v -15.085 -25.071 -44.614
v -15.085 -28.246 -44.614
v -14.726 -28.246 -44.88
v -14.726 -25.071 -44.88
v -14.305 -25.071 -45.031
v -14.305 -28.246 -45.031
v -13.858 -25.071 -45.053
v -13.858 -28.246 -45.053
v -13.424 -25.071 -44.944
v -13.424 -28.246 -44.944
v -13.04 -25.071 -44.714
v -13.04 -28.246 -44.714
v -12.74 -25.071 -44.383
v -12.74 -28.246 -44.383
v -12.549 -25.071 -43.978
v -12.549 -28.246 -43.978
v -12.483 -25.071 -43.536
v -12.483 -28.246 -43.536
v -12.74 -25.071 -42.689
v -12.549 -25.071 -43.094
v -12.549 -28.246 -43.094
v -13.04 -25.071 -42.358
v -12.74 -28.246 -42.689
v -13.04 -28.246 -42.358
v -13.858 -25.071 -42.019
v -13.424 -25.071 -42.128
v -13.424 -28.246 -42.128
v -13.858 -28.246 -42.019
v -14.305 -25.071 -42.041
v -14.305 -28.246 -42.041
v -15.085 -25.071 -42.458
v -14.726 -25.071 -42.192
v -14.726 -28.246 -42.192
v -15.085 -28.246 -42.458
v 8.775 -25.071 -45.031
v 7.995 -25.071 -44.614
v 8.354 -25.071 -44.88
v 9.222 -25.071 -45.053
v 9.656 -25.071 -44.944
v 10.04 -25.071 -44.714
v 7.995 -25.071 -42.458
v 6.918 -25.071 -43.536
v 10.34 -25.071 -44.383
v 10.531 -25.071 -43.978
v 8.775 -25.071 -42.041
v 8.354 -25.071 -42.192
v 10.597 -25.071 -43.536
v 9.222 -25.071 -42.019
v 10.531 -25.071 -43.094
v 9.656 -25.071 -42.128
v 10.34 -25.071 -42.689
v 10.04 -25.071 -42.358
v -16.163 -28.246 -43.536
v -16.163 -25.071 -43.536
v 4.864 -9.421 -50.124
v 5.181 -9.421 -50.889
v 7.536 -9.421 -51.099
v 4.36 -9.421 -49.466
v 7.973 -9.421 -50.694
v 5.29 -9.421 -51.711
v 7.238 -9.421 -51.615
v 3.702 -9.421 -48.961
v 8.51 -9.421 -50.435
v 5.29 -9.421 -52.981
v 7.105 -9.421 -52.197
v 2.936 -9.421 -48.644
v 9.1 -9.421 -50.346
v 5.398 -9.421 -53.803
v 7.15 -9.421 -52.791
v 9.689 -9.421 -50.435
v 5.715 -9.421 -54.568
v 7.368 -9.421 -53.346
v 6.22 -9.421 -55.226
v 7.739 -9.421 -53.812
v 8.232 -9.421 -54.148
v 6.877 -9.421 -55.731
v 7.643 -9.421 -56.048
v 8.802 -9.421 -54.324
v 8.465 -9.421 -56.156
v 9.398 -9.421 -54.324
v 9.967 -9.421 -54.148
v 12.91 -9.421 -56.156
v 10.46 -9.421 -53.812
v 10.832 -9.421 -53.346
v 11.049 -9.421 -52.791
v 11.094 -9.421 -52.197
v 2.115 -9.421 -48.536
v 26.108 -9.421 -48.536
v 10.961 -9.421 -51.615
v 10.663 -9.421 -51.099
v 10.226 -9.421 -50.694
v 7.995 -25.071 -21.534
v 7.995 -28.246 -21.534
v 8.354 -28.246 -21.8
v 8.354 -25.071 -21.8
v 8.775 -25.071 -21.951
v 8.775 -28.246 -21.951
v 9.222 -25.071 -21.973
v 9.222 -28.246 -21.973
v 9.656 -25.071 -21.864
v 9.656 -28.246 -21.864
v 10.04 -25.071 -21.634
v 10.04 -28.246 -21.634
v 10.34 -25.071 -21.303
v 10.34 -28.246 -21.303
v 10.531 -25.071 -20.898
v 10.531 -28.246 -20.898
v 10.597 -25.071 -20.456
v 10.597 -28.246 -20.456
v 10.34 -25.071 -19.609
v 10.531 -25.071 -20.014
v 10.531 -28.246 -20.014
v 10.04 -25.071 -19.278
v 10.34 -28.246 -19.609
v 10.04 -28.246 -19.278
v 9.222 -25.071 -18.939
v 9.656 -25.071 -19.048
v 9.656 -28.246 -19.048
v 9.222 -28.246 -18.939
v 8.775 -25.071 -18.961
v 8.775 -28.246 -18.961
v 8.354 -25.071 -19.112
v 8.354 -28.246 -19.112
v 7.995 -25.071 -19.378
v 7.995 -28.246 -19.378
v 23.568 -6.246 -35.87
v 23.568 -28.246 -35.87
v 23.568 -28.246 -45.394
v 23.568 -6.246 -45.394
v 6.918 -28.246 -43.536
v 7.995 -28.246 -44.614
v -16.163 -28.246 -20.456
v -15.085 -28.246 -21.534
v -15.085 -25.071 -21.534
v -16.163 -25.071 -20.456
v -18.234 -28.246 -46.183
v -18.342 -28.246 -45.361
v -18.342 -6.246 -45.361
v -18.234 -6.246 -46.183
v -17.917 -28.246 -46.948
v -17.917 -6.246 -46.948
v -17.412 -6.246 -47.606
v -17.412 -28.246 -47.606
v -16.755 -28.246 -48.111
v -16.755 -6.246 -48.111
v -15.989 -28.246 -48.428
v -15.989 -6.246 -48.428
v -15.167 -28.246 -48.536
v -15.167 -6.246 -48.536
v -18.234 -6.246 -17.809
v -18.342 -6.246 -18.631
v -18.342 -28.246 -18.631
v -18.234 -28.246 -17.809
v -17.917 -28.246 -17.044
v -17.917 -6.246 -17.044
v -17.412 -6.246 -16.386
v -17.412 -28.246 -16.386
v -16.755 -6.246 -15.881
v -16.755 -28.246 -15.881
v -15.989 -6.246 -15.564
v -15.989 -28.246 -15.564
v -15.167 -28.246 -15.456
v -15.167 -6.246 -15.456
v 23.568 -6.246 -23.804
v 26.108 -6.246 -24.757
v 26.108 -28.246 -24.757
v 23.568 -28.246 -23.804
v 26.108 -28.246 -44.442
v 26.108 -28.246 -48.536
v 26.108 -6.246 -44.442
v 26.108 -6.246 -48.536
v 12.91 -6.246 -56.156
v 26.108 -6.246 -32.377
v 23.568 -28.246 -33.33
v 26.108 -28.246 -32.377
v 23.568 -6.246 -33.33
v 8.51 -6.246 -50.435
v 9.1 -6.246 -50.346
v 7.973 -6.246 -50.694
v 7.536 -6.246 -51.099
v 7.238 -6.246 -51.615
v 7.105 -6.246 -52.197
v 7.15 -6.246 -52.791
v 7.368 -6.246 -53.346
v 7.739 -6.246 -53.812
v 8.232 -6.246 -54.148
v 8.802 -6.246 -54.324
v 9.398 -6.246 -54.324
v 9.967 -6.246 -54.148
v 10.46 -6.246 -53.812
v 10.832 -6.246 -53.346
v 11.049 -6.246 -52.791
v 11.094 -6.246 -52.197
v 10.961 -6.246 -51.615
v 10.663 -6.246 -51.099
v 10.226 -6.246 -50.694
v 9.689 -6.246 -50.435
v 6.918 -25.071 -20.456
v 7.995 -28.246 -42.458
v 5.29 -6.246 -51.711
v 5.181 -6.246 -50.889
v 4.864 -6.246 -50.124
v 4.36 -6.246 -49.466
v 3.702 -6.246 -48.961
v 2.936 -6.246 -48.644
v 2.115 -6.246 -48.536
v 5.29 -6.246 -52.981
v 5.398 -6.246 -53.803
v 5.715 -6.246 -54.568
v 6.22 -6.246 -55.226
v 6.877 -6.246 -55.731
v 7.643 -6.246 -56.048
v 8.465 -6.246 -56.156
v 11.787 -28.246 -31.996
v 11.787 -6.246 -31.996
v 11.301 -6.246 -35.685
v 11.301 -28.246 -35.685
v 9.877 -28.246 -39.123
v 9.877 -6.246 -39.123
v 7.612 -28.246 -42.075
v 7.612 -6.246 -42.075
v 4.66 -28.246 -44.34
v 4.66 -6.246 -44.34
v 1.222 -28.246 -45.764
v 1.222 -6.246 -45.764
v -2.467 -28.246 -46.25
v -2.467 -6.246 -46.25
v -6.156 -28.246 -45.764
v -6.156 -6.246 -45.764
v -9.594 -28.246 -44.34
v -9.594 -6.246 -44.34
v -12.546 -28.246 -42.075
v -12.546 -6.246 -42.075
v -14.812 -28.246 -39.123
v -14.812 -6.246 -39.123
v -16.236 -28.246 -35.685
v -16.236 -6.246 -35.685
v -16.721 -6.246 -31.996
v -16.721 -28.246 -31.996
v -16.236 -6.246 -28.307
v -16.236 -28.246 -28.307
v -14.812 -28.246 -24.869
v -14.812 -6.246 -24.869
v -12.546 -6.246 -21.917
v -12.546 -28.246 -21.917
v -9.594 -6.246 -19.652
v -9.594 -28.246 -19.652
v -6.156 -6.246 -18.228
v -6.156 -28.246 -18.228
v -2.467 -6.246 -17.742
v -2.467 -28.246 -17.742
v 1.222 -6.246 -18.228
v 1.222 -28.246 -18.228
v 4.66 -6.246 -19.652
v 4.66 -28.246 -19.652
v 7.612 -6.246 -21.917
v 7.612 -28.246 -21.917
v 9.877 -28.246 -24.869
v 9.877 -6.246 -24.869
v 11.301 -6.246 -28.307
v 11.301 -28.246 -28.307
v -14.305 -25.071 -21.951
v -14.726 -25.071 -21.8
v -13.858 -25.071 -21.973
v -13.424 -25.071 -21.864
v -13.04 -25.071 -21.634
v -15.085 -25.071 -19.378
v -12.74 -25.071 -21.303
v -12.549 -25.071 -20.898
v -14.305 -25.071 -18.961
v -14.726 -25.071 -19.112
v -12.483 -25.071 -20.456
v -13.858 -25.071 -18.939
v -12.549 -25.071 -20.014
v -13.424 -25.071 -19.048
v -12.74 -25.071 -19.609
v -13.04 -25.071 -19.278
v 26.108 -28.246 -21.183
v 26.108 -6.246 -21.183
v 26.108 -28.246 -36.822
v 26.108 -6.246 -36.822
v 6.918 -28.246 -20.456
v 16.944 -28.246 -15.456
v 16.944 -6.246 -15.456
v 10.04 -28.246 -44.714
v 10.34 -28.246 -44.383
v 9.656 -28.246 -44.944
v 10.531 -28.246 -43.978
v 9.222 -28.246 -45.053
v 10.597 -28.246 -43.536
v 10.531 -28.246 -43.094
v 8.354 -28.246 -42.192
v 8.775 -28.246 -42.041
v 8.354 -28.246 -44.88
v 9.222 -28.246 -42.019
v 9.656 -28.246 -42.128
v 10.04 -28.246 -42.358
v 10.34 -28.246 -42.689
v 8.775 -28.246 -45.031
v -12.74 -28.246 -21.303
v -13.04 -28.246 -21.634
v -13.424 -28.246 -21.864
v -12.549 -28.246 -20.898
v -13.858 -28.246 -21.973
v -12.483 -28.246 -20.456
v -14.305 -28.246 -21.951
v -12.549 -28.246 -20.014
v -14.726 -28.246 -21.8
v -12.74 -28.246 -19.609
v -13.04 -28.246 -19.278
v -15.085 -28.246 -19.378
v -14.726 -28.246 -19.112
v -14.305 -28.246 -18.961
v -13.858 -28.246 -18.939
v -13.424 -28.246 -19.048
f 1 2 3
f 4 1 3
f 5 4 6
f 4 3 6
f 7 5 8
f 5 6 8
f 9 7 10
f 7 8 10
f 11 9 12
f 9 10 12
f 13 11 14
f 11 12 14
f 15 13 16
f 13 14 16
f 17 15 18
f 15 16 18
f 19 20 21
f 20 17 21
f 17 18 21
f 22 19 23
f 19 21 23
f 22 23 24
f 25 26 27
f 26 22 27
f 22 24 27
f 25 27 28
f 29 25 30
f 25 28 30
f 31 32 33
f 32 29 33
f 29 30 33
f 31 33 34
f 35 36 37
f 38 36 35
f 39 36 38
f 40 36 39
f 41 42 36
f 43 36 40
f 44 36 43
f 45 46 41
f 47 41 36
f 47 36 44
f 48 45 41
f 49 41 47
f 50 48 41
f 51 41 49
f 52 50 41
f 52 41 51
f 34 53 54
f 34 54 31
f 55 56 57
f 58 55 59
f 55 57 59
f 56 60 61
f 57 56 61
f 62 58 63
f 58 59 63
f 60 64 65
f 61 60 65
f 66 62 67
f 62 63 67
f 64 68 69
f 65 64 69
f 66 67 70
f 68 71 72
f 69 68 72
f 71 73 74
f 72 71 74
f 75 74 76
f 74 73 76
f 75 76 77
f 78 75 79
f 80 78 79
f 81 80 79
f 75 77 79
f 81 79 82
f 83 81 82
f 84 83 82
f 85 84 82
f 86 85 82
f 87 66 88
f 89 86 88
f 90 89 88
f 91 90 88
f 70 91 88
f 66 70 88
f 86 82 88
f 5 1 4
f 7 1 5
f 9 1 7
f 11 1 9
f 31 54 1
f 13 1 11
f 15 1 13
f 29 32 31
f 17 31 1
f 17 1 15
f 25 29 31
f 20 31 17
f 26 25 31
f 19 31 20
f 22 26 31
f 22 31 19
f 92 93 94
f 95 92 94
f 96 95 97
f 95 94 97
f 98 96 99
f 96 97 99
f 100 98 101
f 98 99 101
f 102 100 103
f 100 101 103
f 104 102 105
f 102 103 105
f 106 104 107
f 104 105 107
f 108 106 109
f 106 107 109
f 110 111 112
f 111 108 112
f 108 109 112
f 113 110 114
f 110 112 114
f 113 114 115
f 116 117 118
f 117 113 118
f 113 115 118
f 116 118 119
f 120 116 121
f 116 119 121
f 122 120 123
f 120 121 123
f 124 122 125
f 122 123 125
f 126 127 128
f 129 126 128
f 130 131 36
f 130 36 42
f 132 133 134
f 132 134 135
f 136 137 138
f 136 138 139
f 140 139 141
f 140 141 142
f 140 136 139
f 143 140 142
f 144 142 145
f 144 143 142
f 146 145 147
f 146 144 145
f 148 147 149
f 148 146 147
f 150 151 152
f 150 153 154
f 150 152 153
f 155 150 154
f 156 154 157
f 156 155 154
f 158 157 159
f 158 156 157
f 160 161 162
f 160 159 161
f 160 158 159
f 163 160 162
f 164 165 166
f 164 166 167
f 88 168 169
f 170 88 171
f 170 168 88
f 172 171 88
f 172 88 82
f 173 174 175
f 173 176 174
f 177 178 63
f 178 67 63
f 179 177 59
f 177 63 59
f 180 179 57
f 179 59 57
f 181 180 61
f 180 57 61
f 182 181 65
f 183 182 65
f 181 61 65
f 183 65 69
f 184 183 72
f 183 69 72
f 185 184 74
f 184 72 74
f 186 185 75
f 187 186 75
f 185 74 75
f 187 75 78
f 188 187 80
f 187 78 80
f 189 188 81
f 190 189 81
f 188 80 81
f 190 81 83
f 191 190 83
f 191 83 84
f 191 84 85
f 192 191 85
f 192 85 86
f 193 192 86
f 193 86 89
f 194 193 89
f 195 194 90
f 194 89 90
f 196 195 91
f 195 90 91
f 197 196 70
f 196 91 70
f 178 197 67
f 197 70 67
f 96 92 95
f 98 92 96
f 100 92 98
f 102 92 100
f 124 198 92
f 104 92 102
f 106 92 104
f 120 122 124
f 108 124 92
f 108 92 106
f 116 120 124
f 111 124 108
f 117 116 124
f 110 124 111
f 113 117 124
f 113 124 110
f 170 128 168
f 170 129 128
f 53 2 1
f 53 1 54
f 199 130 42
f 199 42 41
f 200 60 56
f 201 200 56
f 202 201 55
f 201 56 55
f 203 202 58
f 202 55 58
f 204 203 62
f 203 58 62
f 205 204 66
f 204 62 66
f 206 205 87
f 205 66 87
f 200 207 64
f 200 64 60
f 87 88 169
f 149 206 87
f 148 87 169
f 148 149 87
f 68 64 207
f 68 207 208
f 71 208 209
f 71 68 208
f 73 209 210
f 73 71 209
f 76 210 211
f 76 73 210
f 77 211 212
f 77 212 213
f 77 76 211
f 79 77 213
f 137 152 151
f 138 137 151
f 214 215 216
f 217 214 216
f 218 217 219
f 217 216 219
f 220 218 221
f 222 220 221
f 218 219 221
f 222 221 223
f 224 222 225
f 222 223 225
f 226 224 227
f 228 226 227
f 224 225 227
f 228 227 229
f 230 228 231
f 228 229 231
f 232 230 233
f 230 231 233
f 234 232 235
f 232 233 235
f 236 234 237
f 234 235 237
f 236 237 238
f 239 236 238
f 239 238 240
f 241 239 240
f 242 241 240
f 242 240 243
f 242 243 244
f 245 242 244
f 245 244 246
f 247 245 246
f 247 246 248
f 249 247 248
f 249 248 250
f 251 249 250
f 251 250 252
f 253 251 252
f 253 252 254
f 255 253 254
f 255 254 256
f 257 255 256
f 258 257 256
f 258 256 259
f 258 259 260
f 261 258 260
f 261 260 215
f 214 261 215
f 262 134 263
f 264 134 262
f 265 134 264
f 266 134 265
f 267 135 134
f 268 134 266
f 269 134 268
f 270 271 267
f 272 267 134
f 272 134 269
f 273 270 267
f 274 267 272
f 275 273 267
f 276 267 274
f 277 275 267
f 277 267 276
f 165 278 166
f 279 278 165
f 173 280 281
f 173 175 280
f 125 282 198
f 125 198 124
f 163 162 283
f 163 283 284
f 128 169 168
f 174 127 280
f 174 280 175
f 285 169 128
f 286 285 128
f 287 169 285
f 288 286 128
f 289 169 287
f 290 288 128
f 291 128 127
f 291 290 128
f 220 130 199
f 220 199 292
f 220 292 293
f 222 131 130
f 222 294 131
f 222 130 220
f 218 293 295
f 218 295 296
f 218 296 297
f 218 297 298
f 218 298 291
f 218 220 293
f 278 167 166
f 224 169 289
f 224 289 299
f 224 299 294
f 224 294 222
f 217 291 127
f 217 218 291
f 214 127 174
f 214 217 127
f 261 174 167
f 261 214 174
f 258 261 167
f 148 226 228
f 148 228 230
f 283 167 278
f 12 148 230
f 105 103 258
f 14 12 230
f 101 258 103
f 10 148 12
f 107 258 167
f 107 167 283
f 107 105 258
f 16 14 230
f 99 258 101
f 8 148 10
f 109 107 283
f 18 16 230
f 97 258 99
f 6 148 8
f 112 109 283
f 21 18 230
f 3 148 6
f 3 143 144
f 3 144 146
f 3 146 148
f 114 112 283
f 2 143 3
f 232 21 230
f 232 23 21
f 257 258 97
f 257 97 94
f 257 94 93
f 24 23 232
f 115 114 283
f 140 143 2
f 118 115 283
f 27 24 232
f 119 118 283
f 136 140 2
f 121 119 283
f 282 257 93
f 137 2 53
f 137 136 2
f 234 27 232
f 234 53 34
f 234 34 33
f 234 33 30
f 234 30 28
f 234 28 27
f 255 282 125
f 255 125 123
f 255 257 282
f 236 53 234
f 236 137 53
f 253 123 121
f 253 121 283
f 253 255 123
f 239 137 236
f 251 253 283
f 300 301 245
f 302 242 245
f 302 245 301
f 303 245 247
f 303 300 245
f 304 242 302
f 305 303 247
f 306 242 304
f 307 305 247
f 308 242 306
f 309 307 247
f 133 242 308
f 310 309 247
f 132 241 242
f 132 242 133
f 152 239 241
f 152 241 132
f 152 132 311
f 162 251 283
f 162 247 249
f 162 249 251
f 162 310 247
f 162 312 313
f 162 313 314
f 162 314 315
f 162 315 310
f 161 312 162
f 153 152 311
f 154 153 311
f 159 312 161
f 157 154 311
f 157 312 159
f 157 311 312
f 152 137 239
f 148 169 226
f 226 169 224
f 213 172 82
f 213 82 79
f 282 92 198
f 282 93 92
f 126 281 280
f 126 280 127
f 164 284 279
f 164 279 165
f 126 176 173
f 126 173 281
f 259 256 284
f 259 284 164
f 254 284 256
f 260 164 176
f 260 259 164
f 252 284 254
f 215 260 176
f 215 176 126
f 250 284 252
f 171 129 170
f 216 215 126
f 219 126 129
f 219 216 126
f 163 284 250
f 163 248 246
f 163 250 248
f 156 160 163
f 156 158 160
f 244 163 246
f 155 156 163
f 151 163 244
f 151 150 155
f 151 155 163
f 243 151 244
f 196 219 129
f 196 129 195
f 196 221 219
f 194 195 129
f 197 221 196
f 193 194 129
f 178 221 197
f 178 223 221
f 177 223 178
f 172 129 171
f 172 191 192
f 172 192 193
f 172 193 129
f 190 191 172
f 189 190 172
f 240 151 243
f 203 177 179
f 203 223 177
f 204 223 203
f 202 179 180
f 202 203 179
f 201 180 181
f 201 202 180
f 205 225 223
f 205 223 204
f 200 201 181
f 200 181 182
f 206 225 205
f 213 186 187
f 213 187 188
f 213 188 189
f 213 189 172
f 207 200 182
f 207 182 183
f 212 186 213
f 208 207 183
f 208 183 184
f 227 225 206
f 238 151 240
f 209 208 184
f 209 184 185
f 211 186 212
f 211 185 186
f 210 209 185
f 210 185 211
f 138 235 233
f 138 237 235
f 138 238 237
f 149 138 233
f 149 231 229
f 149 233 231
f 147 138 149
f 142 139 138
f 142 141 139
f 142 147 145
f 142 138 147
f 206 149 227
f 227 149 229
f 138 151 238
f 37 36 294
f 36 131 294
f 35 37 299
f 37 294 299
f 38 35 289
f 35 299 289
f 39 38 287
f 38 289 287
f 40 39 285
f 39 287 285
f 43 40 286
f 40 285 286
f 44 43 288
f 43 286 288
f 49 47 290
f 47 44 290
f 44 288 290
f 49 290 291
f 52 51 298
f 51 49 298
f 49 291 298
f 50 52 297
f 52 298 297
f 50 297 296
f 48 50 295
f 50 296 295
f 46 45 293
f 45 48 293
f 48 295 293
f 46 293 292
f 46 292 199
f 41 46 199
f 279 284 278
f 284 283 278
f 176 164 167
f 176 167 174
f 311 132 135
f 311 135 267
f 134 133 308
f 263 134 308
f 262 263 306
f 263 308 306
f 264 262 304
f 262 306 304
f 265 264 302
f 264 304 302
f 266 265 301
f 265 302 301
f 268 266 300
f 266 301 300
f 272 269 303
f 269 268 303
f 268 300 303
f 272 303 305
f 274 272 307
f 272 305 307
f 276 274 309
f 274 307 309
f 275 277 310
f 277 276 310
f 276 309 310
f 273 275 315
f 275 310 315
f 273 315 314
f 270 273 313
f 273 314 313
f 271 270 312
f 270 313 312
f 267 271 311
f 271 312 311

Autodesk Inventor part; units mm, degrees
ref_plane "YZ Plane" through (0, 0, 0) normal (1, 0, 0) x (0, 1, 0)
ref_plane "XZ Plane" through (0, 0, 0) normal (0, 1, 0) x (-1, 0, 0)
ref_plane "XY Plane" through (0, 0, 0) normal (0, 0, 1) x (1, 0, 0)
ref_plane "Work Plane1" through (-2.4672, -28.2462, -31.996) normal (1, 0, 0) x (0, 1, 0)
sketch "Sketch1" plane through (-2.4672, -28.2462, -31.996) normal (1, 0, 0) x (0, 1, 0)
  line L0 (0, 16.54) -> (22, 16.54)
  line L1 (22, 16.54) -> (22, -16.54)
  line L2 (22, -16.54) -> (0, -16.54)
  line L3 (0, -16.54) -> (0, 16.54)
  line L4 (0, -14) -> (0, 14) projected
  line L5 (0, 13) -> (22, 13) construction
  line L6 (0, -13) -> (22, -13) construction
  line L7 (22, -14) -> (22, 14) projected
  line L8 (22, 0) -> (0, 0) construction
  point P0 (28.2462, 31.996)
  dimension "d3" = 33.08
extrude "Extrusion1" add sketch "Sketch1" along normal blind 28.575 and the other way blind 15.875
sketch "Sketch5" plane through (-18.3422, -6.2462, -15.456) normal (0, 1, 0) x (1, 0, 0)
  circle A0 centre (15.875, 16.54) radius 4.5 projected
  circle A1 centre (15.875, 16.54) radius 14 projected
  circle A2 centre (15.875, 16.54) radius 14.254
  point P0 (18.3422, -15.456)
  dimension "d9" = 0.254
extrude "Extrusion2" cut sketch "Sketch5" against normal through all contours A0 | A1 | A2
sketch "Sketch6" plane through (-18.3422, -6.2462, -15.456) normal (0, 1, 0) x (1, 0, 0)
  circle A0 centre (15.875, 16.54) radius 14.254 projected
  line L0 (0, 0) -> (44.45, 0) projected
  line L1 (44.45, 33.08) -> (44.45, 0) projected
  line L2 (0, 33.08) -> (44.45, 33.08) projected
  line L3 (0, 0) -> (0, 33.08) projected
  line L4 (44.45, 9.301) -> (41.91, 8.3485)
  line L5 (41.91, 8.3485) -> (41.91, 17.8735)
  line L6 (41.91, 17.8735) -> (44.45, 16.921)
  line L7 (44.45, 21.366) -> (41.91, 20.4135)
  line L8 (41.91, 20.4135) -> (41.91, 29.9385)
  line L9 (41.91, 29.9385) -> (44.45, 28.986)
  line L10 (0, 0) -> (0, 33.08) projected
  line L11 (0, 16.54) -> (44.6434, 16.54) construction
  point P0 (18.3422, -15.456)
  point P1 (41.91, 25.176)
  point P2 (41.91, 13.111)
  dimension "d12" = 9.525
  dimension "d13" = 7.62
  dimension "d14" = 7.62
  dimension "d15" = 2.54
  dimension "d61" = 8.636
  dimension "d62" = 12.065
extrude "Extrusion3" cut sketch "Sketch6" against normal through all contours L4 L5 L6 L1 | L1 L7 L8 L9
sketch "Sketch7" plane through (-18.3422, -28.2462, -15.456) normal (0, -1, 0) x (1, 0, 0)
  circle A0 centre (4.335, -28.08) radius 1.524 projected
  circle A1 centre (4.335, -5) radius 1.524 projected
  circle A2 centre (27.415, -5) radius 1.524 projected
  circle A3 centre (27.415, -28.08) radius 1.524 projected
  line L0 (3.2574, -29.1576) -> (2.1797, -28.08)
  line L1 (2.1797, -28.08) -> (3.2574, -27.0024)
  line L2 (44.45, -28.986) -> (41.91, -29.9385) projected
  line L3 (41.91, -29.9385) -> (41.91, -20.4135) projected
  line L4 (41.91, -20.4135) -> (44.45, -21.366) projected
  line L5 (44.45, -16.921) -> (44.45, -21.366) projected
  line L6 (44.45, -16.921) -> (41.91, -17.8735) projected
  line L7 (41.91, -17.8735) -> (41.91, -8.3485) projected
  line L8 (41.91, -8.3485) -> (44.45, -9.301) projected
  line L9 (44.45, 0) -> (44.45, -9.301) projected
  line L10 (44.45, 0) -> (0, 0) projected
  line L11 (0, -33.08) -> (0, 0) projected
  line L12 (0, -33.08) -> (44.45, -33.08) projected
  line L13 (44.45, -28.986) -> (44.45, -33.08) projected
  circle A4 centre (15.875, -16.54) radius 14.254 projected
  line L14 (3.2574, -6.0776) -> (2.1797, -5)
  line L15 (2.1797, -5) -> (3.2574, -3.9224)
  line L16 (26.3374, -6.0776) -> (25.2597, -5)
  line L17 (25.2597, -5) -> (26.3374, -3.9224)
  line L18 (26.3374, -29.1576) -> (25.2597, -28.08)
  line L19 (25.2597, -28.08) -> (26.3374, -27.0024)
  point P0 (18.3422, 15.456)
extrude "Extrusion4" cut sketch "Sketch7" against normal blind 3.175 contours A0 | A0 L0 L1 | A1 | A1 L14 L15 | A2 | A2 L16 L17 | A3 | A3 L18 L19
fillet "Fillet1" radius 3.175 2 edges at (-18.3422, -17.2462, -48.536) (-18.3422, -17.2462, -15.456)
sketch "Sketch8" plane through (23.5678, -6.2462, -23.8045) normal (0, 1, 0) x (1, 0, 0)
  line L0 (5.715, -17.081) -> (5.715, -4.381)
  line L1 (5.715, -4.381) -> (-14.605, -17.081) construction
  line L2 (-14.605, -17.081) -> (5.715, -17.081)
  line L3 (-38.735, -8.3485) -> (2.54, -8.3485) projected
  line L4 (2.54, 0.9525) -> (2.54, -8.3485) projected
  line L5 (-16.2877, -14.3886) -> (4.0323, -1.6886)
  line L6 (-14.605, -17.081) -> (-16.2877, -14.3886)
  line L7 (5.715, -4.381) -> (4.0323, -1.6886)
  dimension "d26" = 20.32
  dimension "d27" = 12.7
  dimension "d28" = 8.7325
  dimension "d29" = 3.175
  dimension "d30" = 3.175
extrude "Extrusion5" cut sketch "Sketch8" along normal through all both and the other way through all
sketch "Sketch11" plane through (23.5678, -6.2462, -23.8045) normal (0, 1, 0) x (1, 0, 0)
  line L0 (2.54, 20.6375) -> (2.54, 24.7315) projected
  line L1 (2.54, 24.7315) -> (-10.6582, 32.3515)
  line L2 (-10.6582, 32.3515) -> (-18.2782, 32.3515)
  line L3 (-18.2782, 32.3515) -> (-18.2782, 24.7315)
  circle A0 centre (-26.035, 8.1915) radius 14.254 projected
  line L4 (-6.6235, -8.3485) -> (2.54, -2.6213) projected
  line L5 (2.54, 0.9525) -> (2.54, -2.6213) projected
  line L6 (2.54, 0.9525) -> (0, 0) projected
  line L7 (0, 0) -> (0, 9.525) projected
  line L8 (0, 9.525) -> (2.54, 8.5725) projected
  line L9 (2.54, 13.0175) -> (2.54, 8.5725) projected
  line L10 (2.54, 13.0175) -> (0, 12.065) projected
  line L11 (0, 12.065) -> (0, 21.59) projected
  line L12 (0, 21.59) -> (2.54, 20.6375) projected
  line L13 (2.54, 24.7315) -> (2.54, 20.6375) projected
  line L14 (-38.735, 24.7315) -> (2.54, 24.7315) projected
  arc A1 (-38.735, 24.7315) -> (-41.91, 21.5565) centre (-38.735, 21.5565) ccw projected
  line L15 (-41.91, -5.1735) -> (-41.91, 21.5565) projected
  arc A2 (-41.91, -5.1735) -> (-38.735, -8.3485) centre (-38.735, -5.1735) ccw projected
  line L16 (-38.735, -8.3485) -> (-6.6235, -8.3485) projected
  circle A3 centre (-14.4682, 28.5415) radius 1.5875
  point P0 (-23.5678, -23.8045)
  point P1 (2.54, 24.7315)
  point P2 (-41.91, 8.1915)
  dimension "d42" = 120
  dimension "d43" = 7.62
  dimension "d45" = 7.62
  dimension "d46" = 3.175
  dimension "d47" = 3.81
  dimension "d48" = 3.81
  dimension "d53" = 20.35
  dimension "d63" = 11.5668
extrude "Extrusion7" add sketch "Sketch11" against normal blind 3.175 contours L14 L3 L2 L1 | A3
fillet "Fillet2" radius 3.175 1 edges at (5.2896, -7.8337, -56.156)
fillet "Fillet3" radius 3.175 1 edges at (5.2896, -7.8337, -48.536)
hole "Hole2" at (9.0996, -6.2462, -52.346) direction (0, -1, 0) diameter 4 depth 3.175 clearance for "Hex Head Machine Screw" size "M4" standard "Ansi Metric M Profile"
equation "\"d45\" = d43"
equation "\"d47\" = 0.5 * d43"
equation "\"d48\" = 0.5 * d43"
properties part number "Brushless Motor Seat_3DPrint"
